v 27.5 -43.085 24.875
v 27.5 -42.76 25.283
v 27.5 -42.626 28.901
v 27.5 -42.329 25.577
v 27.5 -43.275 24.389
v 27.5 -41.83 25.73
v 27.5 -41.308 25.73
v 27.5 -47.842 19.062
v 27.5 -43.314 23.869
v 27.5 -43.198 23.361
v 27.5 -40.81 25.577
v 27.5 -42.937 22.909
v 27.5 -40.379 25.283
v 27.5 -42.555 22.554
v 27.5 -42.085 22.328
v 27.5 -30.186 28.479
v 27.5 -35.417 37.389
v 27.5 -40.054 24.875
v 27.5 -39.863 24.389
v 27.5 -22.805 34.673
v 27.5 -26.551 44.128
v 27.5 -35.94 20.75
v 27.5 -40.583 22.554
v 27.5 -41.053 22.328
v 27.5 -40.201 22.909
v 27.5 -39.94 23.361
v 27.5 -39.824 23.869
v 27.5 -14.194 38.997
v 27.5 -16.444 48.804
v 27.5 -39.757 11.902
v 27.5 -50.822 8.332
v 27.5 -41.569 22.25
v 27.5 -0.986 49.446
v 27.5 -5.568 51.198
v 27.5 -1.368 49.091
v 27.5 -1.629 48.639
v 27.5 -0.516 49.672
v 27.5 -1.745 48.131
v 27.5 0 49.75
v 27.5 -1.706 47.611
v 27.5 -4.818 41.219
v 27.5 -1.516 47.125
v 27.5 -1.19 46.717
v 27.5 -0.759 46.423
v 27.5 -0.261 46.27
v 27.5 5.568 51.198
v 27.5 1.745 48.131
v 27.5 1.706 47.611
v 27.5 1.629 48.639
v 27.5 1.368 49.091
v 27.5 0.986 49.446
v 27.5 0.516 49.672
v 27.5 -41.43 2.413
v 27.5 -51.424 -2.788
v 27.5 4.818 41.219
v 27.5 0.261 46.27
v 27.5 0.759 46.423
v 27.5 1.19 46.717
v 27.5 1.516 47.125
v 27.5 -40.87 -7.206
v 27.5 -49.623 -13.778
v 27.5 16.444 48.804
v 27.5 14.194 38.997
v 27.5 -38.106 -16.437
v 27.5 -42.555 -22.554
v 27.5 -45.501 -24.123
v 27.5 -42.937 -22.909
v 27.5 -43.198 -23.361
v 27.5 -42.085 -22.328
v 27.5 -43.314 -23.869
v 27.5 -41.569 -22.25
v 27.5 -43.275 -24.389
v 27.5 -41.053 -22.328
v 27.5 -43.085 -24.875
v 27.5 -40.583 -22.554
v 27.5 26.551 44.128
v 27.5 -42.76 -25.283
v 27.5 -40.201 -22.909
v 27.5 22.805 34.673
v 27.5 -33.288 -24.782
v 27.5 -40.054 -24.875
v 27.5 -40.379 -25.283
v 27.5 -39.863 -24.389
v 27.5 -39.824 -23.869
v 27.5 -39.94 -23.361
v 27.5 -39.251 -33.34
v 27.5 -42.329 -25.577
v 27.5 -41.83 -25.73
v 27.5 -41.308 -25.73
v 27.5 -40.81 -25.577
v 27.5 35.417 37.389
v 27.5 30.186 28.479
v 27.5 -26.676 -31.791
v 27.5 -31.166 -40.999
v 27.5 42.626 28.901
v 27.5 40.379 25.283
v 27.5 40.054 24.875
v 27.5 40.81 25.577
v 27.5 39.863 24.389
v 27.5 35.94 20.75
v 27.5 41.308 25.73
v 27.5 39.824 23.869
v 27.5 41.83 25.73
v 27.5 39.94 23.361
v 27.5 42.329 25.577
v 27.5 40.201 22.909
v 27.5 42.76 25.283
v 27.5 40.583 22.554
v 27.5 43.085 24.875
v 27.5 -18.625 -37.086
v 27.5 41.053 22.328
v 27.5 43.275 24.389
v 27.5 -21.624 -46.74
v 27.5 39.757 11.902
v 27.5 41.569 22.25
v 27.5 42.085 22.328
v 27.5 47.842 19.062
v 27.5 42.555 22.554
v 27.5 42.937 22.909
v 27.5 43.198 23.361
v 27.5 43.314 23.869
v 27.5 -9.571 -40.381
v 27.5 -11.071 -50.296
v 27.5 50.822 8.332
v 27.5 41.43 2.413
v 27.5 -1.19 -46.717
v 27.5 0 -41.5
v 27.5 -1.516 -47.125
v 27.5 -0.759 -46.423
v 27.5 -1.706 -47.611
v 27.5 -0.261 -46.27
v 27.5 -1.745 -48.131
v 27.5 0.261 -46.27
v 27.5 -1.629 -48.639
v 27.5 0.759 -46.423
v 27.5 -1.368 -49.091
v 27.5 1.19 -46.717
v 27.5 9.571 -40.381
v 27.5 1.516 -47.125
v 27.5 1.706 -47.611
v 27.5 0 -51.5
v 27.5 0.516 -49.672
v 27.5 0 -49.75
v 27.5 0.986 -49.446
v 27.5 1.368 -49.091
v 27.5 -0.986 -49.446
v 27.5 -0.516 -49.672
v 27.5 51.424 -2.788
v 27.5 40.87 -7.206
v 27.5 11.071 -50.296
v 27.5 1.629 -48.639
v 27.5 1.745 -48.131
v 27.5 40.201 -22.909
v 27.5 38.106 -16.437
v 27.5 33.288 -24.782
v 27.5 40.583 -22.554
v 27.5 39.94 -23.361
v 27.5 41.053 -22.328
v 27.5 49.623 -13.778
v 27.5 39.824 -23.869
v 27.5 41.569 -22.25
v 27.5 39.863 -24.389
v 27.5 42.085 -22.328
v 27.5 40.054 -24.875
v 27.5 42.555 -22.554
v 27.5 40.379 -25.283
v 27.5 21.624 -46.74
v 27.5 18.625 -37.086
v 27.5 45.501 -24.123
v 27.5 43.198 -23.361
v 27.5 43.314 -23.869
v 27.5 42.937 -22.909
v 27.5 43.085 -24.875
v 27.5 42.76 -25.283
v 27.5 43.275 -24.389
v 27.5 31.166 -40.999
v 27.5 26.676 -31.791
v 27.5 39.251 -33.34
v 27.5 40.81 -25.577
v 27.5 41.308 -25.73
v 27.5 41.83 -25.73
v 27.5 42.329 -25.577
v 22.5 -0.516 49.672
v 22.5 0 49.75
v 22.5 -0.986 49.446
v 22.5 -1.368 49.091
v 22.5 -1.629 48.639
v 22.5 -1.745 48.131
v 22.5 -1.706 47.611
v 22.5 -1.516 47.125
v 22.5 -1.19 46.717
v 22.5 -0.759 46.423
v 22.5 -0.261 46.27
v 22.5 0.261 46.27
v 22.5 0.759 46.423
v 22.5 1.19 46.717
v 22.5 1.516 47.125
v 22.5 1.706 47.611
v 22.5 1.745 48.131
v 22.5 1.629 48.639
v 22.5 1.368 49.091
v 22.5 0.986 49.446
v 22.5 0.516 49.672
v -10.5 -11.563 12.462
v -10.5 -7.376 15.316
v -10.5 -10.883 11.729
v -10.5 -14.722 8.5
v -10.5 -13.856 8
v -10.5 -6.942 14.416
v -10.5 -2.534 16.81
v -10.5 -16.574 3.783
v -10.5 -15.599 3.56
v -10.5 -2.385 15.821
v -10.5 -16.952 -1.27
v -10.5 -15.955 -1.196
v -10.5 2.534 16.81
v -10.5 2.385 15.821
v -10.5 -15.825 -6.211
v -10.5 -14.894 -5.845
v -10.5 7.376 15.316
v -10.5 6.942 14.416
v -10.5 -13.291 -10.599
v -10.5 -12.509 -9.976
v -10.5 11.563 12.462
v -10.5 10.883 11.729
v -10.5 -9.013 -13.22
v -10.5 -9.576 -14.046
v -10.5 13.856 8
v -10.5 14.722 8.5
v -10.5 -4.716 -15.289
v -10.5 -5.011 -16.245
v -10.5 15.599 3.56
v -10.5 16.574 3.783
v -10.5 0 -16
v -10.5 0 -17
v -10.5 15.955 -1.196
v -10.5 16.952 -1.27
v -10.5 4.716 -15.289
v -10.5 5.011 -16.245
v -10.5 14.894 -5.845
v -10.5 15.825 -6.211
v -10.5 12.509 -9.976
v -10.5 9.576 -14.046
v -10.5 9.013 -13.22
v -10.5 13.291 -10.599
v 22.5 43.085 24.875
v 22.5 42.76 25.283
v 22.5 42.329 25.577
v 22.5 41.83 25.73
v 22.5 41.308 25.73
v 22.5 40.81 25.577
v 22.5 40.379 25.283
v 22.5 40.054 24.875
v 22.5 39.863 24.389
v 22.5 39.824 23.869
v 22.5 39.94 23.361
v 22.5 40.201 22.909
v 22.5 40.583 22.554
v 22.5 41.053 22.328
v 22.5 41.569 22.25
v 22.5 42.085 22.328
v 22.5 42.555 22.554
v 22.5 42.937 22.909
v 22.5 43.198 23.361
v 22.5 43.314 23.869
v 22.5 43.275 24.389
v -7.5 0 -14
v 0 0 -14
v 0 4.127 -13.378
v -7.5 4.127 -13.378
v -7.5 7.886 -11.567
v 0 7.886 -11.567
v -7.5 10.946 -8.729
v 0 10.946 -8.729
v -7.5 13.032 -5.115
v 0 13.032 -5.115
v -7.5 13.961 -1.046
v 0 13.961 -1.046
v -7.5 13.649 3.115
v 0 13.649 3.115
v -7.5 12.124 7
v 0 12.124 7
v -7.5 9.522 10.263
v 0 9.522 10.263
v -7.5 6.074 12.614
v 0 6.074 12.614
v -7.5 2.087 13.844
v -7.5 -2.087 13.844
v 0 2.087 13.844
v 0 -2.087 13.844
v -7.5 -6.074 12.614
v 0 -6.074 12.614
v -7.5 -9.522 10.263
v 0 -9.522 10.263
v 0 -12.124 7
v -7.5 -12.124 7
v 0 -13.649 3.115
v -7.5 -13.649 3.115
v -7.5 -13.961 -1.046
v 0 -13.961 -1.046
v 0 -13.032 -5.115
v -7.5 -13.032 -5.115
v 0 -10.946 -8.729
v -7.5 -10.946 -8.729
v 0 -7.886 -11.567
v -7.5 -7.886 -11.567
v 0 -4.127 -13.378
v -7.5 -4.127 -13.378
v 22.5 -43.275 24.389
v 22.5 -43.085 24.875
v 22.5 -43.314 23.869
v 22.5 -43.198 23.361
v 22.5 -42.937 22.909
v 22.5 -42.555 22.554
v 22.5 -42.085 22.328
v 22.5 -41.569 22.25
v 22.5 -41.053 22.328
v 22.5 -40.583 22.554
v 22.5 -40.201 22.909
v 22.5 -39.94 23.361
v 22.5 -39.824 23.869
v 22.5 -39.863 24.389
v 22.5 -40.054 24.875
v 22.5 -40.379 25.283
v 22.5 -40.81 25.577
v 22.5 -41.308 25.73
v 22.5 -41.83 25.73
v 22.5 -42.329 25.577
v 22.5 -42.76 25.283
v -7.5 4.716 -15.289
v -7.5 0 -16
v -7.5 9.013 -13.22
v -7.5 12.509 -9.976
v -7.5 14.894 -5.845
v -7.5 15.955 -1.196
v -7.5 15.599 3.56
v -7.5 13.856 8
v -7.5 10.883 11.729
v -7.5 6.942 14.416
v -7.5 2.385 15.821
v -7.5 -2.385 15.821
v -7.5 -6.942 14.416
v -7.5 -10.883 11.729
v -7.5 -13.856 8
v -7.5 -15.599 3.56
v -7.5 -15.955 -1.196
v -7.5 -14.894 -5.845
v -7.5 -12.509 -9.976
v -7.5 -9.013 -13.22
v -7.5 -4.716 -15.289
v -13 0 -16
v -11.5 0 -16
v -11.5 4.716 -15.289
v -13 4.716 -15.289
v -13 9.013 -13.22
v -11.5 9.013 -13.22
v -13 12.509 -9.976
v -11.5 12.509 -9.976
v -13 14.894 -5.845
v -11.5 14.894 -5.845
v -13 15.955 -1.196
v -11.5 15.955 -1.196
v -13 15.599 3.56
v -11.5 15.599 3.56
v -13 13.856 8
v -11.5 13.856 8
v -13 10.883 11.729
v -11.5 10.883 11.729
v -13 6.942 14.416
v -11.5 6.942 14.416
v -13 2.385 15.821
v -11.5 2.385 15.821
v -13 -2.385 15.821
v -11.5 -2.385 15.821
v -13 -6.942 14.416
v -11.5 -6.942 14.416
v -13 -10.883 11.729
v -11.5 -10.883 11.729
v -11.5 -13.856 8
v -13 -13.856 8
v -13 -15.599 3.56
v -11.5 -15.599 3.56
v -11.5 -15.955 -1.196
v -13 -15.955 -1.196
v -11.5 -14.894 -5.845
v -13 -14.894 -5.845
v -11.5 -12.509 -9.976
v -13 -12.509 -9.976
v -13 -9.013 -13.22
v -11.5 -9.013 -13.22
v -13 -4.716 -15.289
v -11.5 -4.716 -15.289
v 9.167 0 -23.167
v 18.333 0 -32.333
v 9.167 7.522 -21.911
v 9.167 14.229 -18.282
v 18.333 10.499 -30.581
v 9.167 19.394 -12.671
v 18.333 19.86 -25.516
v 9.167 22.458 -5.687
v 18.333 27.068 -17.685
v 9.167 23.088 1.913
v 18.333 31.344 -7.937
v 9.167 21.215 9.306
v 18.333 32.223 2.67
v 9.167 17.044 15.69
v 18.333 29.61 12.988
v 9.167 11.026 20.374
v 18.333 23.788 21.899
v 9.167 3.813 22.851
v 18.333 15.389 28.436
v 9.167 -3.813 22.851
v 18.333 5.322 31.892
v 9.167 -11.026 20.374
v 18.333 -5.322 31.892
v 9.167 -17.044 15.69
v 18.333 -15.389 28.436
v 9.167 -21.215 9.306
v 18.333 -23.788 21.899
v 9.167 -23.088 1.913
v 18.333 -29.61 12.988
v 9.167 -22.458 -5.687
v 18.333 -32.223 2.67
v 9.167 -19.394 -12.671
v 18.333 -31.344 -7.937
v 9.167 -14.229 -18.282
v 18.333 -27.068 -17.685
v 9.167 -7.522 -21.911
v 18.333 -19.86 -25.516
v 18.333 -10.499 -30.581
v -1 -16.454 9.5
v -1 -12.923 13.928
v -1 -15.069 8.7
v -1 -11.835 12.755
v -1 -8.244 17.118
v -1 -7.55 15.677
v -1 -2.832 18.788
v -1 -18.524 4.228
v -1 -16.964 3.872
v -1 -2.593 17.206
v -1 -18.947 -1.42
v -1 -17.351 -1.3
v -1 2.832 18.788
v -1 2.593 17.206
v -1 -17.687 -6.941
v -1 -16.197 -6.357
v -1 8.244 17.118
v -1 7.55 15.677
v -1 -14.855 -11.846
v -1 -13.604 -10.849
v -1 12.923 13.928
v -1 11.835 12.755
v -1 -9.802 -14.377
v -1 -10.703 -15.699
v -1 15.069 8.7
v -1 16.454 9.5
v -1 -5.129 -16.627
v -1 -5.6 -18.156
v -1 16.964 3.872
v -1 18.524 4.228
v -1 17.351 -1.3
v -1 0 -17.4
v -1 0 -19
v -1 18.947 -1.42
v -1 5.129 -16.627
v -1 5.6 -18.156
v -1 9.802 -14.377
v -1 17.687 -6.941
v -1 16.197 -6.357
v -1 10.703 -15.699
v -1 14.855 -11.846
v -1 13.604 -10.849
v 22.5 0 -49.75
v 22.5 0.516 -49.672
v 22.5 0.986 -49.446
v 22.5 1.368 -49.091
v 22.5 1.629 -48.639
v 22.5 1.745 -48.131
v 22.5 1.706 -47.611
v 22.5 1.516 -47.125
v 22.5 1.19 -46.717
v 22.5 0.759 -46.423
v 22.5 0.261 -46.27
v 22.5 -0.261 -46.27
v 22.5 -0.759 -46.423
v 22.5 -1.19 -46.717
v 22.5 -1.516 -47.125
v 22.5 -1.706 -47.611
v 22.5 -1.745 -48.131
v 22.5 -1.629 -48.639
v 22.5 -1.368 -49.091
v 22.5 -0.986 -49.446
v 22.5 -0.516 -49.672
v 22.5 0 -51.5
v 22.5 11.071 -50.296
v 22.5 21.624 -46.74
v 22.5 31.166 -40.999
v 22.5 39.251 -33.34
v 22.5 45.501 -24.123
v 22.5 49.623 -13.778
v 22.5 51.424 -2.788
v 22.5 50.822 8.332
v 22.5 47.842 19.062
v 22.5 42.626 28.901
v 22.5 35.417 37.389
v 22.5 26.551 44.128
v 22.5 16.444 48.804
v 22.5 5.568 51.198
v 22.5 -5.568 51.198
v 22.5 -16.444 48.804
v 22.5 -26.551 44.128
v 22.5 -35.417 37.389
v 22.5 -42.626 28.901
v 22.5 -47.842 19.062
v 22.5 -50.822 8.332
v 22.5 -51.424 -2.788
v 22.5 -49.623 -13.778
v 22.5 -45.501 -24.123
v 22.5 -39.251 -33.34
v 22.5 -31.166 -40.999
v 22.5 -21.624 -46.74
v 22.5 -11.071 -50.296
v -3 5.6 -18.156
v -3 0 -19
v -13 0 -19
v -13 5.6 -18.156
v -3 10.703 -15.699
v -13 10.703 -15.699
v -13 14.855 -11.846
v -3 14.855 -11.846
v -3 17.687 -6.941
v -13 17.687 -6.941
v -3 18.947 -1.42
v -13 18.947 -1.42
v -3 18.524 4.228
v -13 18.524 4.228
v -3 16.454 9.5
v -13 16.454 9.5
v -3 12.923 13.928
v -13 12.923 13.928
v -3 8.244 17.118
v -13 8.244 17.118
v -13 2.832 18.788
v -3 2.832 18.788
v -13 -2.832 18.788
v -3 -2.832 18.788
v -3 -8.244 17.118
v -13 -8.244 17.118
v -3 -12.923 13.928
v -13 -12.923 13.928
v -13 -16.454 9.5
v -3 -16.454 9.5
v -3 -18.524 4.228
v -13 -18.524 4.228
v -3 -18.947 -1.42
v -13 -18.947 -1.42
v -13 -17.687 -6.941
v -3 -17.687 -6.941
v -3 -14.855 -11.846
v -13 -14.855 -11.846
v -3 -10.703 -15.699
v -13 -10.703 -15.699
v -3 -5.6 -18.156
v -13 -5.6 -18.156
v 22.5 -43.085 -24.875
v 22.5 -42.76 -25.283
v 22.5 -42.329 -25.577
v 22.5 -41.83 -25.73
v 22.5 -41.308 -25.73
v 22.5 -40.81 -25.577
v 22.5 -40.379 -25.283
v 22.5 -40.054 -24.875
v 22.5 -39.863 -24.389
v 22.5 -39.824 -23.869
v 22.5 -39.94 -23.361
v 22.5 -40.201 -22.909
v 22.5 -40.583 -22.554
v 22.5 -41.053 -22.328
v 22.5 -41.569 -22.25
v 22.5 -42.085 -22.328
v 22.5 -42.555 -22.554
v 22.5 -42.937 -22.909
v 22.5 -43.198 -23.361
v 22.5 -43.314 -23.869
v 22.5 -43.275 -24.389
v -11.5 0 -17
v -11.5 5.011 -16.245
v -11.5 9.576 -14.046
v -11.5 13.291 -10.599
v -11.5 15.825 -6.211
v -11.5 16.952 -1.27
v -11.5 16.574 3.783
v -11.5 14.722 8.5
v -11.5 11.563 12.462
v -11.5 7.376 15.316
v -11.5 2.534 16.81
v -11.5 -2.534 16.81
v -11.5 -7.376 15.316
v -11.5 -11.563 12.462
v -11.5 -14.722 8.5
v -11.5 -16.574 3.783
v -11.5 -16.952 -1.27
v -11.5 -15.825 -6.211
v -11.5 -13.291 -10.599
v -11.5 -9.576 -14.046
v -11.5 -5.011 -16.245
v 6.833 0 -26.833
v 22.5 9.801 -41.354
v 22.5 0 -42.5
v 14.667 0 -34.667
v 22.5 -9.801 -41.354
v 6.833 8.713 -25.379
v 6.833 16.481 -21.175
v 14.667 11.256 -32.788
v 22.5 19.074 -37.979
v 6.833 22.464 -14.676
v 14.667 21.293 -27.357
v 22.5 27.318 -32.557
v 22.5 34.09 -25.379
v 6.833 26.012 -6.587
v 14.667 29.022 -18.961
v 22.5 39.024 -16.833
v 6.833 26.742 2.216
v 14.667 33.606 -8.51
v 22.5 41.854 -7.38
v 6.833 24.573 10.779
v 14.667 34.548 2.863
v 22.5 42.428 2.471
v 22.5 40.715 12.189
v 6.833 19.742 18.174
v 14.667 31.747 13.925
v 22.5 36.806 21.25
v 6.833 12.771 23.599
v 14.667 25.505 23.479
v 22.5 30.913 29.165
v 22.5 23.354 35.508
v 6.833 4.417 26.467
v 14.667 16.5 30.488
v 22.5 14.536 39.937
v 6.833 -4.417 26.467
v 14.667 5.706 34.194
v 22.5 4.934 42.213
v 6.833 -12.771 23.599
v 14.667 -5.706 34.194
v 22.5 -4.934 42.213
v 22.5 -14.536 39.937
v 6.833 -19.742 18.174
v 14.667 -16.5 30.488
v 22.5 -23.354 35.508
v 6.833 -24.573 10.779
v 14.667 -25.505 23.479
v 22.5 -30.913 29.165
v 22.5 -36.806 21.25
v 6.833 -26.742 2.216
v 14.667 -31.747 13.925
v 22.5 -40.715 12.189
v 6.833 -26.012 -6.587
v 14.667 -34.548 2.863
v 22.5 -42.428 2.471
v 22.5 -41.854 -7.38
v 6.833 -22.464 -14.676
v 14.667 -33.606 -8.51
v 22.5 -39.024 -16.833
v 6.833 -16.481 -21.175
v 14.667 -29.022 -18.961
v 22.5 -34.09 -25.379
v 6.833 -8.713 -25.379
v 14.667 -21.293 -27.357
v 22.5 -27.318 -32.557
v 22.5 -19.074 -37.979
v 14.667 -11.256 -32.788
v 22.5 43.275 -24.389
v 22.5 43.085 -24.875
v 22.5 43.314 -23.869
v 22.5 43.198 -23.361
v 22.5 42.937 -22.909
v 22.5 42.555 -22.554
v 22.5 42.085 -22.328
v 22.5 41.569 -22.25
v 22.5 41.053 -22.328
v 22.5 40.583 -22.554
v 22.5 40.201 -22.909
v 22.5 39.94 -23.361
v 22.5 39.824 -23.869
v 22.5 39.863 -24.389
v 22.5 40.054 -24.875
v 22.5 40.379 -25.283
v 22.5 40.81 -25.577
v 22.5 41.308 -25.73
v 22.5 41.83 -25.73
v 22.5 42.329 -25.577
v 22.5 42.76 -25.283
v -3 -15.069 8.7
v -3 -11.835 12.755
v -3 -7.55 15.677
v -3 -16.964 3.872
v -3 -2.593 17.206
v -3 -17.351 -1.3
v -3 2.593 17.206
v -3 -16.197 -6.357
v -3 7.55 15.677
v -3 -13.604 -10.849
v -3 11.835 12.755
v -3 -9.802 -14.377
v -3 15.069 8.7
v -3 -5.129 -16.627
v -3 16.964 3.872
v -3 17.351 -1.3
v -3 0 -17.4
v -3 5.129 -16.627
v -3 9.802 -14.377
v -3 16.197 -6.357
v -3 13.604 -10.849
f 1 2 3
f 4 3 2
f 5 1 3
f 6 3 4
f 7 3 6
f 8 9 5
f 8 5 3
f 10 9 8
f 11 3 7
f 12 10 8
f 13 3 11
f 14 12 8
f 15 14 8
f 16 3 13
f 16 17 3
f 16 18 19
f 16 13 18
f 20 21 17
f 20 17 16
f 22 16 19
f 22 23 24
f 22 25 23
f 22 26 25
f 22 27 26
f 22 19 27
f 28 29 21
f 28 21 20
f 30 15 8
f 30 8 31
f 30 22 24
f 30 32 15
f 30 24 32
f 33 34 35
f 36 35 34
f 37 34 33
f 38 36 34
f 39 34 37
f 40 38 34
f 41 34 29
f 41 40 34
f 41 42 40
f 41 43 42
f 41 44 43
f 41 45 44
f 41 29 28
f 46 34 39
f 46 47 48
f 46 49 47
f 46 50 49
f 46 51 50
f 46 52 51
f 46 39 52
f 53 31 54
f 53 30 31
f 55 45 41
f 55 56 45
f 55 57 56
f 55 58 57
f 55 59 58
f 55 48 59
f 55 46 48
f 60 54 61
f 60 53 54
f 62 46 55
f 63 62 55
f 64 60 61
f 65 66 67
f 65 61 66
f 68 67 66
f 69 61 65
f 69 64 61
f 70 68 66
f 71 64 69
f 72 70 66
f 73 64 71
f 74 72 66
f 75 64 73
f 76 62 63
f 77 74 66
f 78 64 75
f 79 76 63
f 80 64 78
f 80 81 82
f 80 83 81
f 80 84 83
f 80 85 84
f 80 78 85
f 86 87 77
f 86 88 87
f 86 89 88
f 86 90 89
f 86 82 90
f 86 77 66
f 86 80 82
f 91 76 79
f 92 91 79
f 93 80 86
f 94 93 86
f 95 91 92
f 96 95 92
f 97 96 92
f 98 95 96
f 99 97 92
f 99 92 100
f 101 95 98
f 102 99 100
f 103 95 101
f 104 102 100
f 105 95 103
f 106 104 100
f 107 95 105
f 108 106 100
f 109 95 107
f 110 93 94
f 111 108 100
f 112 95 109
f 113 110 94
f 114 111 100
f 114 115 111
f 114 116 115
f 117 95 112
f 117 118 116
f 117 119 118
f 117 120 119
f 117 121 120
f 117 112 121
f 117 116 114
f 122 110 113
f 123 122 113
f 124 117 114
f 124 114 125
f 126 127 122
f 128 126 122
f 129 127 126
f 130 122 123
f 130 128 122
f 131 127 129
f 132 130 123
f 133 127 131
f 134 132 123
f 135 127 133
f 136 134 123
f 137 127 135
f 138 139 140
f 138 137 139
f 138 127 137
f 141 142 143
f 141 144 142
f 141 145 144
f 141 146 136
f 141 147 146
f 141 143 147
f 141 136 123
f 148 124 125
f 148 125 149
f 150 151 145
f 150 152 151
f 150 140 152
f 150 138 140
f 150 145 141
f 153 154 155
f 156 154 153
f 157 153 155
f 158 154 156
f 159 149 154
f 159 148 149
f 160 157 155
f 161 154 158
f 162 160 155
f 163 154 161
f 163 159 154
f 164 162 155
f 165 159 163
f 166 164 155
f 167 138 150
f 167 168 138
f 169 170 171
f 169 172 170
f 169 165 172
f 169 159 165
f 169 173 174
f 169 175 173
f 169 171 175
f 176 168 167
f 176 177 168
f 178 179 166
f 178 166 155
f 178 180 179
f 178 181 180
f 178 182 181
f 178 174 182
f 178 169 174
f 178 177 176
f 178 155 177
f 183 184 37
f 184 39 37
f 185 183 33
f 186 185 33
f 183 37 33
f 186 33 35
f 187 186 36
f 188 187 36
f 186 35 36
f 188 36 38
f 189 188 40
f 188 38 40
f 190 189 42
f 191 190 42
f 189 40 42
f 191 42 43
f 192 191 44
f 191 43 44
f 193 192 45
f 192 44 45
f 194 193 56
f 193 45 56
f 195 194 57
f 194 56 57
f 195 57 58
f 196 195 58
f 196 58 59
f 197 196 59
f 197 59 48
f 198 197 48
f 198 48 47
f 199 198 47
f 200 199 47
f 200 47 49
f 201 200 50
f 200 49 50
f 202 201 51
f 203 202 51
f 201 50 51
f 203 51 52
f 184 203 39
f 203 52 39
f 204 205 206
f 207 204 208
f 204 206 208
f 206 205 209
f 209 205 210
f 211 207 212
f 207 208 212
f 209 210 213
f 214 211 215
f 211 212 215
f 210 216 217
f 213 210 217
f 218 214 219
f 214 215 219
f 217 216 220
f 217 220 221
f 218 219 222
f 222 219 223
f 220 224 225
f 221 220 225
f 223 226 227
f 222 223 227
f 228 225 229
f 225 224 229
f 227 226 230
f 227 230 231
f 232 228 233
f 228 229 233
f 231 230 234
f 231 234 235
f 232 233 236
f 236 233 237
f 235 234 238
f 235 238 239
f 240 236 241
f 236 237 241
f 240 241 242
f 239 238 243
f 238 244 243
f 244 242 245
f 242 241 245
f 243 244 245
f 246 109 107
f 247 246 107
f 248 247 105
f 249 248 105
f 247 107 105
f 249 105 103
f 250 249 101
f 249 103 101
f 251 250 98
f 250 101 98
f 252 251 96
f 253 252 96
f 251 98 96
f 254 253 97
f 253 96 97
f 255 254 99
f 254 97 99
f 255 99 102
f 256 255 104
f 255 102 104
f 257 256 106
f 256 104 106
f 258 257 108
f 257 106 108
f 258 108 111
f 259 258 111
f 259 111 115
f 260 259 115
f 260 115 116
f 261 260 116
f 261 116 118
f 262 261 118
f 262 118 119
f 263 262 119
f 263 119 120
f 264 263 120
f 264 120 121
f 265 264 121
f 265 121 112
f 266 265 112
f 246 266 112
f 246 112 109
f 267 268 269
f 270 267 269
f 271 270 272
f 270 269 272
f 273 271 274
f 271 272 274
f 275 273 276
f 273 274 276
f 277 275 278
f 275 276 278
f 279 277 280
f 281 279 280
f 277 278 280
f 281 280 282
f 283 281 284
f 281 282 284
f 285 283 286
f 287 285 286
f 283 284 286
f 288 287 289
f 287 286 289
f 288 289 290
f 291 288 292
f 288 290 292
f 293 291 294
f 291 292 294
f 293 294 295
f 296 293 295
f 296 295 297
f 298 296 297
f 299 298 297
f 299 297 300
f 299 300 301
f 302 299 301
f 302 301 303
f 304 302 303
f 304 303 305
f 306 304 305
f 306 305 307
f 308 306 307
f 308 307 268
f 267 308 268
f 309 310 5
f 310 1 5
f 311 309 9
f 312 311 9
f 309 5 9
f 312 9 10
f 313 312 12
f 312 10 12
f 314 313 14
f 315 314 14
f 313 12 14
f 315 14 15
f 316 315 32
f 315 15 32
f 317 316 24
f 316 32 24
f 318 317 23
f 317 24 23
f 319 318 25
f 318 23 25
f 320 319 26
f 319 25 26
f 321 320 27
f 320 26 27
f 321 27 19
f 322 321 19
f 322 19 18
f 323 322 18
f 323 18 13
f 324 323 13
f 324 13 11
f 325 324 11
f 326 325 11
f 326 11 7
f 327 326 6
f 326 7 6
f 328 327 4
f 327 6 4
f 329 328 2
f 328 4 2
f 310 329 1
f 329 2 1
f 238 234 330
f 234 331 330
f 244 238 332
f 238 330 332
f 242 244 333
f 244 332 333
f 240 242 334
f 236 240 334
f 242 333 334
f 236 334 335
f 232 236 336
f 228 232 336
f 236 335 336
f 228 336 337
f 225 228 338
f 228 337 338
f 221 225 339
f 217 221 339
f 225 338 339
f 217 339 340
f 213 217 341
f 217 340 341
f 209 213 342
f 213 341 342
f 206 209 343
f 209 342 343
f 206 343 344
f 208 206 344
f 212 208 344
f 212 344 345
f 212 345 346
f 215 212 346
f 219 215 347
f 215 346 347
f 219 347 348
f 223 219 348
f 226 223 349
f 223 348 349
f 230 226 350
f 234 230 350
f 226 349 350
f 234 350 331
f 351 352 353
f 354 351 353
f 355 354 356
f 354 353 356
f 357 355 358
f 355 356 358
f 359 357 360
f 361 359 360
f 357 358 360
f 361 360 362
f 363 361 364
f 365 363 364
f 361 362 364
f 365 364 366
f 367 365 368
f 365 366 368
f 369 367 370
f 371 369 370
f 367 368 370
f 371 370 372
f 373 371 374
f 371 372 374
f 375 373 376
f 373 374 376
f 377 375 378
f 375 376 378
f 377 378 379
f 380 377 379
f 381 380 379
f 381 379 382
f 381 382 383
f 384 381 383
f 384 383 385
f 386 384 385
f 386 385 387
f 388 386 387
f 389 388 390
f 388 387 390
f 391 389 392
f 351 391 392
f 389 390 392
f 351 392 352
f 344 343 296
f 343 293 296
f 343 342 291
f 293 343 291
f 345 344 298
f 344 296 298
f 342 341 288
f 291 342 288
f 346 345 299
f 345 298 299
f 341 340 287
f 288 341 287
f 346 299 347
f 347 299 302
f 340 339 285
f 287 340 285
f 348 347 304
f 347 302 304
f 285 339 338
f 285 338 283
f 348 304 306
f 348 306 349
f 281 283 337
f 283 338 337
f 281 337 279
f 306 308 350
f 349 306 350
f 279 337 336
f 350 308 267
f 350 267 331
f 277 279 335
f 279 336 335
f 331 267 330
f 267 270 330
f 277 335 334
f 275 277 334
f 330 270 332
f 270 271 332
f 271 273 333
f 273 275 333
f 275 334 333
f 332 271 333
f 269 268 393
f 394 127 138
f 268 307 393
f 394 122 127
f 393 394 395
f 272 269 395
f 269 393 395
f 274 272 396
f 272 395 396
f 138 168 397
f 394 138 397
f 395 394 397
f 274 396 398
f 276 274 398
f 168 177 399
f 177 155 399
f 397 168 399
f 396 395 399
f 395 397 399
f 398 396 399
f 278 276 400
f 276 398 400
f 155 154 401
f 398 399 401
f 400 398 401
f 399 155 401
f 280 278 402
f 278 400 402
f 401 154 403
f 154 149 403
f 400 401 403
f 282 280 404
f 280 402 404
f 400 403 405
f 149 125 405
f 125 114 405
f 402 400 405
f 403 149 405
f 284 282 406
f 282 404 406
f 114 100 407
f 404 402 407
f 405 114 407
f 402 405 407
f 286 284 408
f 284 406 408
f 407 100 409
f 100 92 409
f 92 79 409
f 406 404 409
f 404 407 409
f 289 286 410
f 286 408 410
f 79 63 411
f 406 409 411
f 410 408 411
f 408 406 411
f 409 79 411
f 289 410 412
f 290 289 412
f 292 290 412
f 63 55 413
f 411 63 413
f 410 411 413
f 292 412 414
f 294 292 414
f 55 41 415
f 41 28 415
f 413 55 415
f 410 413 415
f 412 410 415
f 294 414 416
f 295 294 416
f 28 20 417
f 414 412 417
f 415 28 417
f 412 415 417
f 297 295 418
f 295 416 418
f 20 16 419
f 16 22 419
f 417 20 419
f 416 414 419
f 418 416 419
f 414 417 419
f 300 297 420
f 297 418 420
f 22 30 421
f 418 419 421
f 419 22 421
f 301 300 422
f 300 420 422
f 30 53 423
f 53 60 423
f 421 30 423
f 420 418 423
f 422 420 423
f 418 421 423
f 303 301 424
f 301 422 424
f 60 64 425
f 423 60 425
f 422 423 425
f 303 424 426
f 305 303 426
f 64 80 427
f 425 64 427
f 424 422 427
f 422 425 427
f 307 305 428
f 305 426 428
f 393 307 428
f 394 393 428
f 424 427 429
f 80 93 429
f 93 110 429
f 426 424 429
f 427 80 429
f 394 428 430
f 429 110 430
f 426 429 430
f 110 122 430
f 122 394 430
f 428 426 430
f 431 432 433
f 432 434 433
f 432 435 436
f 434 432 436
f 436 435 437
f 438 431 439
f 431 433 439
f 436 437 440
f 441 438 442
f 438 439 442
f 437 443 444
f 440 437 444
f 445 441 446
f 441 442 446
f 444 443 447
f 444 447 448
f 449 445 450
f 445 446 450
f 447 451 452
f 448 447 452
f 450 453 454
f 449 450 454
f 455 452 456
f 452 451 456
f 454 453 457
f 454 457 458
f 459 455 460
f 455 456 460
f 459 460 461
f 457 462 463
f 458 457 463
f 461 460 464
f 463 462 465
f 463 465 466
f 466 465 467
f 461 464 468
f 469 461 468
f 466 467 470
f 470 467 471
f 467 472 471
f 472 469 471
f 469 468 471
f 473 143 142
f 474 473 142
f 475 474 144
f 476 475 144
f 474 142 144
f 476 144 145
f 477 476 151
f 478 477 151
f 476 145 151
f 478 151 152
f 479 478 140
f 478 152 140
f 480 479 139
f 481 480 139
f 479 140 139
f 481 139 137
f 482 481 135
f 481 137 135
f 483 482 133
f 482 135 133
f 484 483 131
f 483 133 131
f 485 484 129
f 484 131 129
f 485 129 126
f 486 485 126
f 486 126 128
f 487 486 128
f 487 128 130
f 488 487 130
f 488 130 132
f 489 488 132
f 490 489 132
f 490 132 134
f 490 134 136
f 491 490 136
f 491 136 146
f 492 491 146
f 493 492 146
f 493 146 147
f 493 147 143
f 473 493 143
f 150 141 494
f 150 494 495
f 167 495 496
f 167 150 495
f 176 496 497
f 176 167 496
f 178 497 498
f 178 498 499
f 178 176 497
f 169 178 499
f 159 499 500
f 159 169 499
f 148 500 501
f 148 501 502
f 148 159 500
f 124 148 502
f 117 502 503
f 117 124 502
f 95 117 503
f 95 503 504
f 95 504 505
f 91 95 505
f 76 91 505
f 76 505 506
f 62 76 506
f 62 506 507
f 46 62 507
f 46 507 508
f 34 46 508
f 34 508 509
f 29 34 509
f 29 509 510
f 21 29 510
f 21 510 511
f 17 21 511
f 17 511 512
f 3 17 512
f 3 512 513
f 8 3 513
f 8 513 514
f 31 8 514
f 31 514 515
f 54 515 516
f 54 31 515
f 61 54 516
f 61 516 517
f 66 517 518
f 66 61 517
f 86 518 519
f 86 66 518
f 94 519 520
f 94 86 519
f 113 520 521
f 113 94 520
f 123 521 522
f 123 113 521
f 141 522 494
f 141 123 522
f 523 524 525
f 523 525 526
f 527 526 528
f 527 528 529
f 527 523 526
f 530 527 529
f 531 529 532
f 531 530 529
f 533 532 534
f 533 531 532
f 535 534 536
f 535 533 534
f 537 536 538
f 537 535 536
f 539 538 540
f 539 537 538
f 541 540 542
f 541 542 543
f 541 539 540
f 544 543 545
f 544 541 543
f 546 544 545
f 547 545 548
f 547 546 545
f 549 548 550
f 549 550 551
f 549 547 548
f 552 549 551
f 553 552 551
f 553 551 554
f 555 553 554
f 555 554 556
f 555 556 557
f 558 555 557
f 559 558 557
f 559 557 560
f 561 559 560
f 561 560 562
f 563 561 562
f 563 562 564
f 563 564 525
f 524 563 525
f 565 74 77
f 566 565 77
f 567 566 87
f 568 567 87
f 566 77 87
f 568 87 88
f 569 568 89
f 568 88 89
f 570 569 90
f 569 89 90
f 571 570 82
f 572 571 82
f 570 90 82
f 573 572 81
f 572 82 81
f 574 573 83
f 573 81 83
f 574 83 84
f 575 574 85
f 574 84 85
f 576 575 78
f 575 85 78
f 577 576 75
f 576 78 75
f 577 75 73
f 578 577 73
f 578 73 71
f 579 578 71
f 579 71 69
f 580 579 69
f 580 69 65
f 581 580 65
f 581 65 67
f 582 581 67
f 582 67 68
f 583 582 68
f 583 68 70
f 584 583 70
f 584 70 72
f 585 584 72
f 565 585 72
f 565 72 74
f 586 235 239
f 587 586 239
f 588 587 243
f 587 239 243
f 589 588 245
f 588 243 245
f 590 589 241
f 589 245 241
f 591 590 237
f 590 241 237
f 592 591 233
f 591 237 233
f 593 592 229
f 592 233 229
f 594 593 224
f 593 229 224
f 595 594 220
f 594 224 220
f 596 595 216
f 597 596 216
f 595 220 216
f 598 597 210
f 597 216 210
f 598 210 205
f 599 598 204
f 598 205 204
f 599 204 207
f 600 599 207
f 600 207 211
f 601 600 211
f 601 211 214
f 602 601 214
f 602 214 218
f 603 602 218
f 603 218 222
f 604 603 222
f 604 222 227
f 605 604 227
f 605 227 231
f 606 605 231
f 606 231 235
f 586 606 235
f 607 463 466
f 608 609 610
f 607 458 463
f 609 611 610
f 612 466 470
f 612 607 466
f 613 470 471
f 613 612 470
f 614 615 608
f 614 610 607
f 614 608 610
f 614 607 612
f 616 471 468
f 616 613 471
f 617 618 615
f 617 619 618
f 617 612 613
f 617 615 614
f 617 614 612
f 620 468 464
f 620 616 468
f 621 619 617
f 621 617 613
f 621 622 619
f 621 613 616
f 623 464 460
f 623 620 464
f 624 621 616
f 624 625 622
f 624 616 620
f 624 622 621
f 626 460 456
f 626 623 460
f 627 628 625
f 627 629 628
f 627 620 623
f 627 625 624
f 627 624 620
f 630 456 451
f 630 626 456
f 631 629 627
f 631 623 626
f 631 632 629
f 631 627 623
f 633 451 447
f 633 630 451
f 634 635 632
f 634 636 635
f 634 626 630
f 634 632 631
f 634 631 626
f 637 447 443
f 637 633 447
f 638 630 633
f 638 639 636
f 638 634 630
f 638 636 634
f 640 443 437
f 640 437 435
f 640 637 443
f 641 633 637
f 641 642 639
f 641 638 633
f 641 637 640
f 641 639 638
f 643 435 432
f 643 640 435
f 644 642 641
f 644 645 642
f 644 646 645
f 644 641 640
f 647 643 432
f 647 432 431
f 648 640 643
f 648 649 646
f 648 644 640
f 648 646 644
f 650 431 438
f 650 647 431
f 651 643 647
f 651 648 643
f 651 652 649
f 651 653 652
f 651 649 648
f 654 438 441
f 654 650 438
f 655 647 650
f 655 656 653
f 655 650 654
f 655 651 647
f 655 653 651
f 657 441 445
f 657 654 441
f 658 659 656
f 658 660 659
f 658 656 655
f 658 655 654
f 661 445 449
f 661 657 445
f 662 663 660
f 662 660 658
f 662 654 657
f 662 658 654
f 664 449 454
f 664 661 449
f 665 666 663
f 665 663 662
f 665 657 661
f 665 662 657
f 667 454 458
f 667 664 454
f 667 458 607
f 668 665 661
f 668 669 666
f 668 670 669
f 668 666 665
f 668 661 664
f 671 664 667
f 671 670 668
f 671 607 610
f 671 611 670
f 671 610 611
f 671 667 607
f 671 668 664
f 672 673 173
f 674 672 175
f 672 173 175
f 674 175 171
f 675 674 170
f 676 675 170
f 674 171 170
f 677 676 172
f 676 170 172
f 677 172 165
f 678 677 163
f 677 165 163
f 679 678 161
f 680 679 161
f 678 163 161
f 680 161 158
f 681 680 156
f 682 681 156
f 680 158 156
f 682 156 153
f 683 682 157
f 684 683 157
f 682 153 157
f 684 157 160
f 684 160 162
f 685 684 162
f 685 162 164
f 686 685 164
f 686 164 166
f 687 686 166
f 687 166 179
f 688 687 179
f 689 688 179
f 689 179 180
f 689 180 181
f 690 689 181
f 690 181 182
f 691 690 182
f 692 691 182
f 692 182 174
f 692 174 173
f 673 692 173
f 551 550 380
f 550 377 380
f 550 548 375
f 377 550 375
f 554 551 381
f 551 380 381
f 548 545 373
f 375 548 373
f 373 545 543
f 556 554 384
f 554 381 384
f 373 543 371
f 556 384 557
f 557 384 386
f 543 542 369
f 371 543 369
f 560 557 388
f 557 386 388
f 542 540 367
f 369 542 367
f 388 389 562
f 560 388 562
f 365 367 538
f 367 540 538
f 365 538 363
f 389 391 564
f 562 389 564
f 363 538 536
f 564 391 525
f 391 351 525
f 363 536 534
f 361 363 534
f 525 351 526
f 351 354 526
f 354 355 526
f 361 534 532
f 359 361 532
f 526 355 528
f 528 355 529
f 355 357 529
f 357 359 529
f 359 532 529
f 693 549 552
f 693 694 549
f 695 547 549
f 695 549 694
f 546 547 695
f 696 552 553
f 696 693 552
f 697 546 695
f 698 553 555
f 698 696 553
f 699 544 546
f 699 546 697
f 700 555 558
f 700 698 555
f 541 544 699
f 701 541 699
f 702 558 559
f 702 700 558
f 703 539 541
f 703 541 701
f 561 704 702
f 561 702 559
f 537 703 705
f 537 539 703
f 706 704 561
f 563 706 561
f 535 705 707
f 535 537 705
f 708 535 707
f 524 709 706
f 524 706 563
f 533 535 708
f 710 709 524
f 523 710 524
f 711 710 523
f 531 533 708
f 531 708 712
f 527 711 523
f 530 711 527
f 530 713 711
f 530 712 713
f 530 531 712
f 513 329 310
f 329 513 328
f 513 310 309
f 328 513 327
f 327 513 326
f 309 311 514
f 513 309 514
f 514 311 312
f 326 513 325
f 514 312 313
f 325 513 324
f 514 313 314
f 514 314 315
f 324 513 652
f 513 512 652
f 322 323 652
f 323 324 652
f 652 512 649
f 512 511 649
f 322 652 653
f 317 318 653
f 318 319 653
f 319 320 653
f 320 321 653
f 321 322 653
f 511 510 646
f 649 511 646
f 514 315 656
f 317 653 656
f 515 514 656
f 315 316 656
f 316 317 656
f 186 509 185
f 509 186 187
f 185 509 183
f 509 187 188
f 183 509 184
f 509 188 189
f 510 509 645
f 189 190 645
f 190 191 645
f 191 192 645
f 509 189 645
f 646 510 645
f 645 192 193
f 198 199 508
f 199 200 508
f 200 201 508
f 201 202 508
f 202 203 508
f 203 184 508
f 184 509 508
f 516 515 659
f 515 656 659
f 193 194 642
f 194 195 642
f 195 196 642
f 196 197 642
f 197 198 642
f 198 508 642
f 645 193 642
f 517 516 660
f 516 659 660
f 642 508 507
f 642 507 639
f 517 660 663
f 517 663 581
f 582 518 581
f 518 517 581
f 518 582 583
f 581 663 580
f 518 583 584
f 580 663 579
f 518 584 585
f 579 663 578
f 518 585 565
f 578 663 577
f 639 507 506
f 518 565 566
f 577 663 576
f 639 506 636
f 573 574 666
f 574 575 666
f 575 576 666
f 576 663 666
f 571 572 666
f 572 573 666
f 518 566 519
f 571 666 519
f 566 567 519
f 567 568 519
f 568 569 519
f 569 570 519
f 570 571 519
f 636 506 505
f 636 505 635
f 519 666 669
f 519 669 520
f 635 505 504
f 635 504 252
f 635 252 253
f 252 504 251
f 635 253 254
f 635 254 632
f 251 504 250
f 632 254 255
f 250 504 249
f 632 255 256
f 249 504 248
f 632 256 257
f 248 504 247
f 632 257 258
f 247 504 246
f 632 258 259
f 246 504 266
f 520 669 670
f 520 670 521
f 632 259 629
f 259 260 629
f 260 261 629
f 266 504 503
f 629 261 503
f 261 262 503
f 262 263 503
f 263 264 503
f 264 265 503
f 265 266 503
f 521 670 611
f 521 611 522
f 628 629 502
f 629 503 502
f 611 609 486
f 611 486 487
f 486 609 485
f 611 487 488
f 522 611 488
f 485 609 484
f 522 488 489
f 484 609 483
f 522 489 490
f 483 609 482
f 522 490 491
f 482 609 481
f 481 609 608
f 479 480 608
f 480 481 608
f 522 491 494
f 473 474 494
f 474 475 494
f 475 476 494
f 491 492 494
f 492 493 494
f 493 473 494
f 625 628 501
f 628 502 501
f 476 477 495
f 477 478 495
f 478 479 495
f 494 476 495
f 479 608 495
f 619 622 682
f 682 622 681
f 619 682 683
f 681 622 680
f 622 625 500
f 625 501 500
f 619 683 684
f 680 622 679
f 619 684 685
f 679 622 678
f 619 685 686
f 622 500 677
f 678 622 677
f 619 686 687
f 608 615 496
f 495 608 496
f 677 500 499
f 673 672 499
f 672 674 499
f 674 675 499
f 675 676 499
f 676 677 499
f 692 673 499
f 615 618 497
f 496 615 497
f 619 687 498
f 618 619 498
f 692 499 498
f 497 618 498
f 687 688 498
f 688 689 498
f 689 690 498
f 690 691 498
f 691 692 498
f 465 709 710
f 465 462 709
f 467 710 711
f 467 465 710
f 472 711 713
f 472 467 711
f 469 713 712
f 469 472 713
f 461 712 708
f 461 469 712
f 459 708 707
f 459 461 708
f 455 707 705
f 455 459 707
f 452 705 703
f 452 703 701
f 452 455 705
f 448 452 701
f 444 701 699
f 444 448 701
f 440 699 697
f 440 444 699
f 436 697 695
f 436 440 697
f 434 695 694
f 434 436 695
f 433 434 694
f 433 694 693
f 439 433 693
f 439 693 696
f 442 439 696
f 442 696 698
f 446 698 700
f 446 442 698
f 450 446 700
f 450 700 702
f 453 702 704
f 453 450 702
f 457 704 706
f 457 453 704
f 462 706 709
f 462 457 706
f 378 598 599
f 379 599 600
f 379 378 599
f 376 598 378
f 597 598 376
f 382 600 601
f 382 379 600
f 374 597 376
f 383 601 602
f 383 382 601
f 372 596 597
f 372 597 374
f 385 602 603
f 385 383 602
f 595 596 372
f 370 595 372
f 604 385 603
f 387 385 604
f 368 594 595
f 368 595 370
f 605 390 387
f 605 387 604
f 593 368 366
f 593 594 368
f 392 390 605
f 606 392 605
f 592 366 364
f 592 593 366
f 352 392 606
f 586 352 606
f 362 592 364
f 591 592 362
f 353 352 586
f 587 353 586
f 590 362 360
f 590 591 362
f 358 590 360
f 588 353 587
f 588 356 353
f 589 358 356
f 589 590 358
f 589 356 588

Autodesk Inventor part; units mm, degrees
ref_plane "YZ Plane" through (0, 0, 0) normal (1, 0, 0) x (0, 1, 0)
ref_plane "XZ Plane" through (0, 0, 0) normal (0, 1, 0) x (-1, 0, 0)
ref_plane "XY Plane" through (0, 0, 0) normal (0, 0, 1) x (1, 0, 0)
sketch "Sketch1" plane through (0, 0, 0) normal (0, 1, 0) x (-1, 0, 0)
  line L0 (0, 0) -> (-9.3015, 0)
  line L1 (7.5, -14) -> (0, -14)
  line L2 (13, -19) -> (13, -16)
  line L3 (7.5, -16) -> (7.5, -14)
  line L4 (13, -19) -> (3, -19)
  line L5 (3, -19) -> (3, -17.4)
  line L6 (3, -17.4) -> (1, -17.4)
  line L7 (1, -17.4) -> (1, -19)
  line L8 (-22.5, -51.5) -> (-27.5, -51.5)
  line L9 (-27.5, -51.5) -> (-27.5, -41.5)
  line L10 (-27.5, -41.5) -> (0, -14)
  line L11 (13, -16) -> (11.5, -16)
  line L12 (11.5, -16) -> (11.5, -17)
  line L13 (11.5, -17) -> (10.5, -17)
  line L14 (10.5, -17) -> (10.5, -16)
  line L15 (10.5, -16) -> (7.5, -16)
  line L16 (-22.5, -51.5) -> (-22.5, -42.5)
  line L17 (-22.5, -42.5) -> (1, -19)
  point P0 (25, -13.6173)
  dimension "d2" = 28
  dimension "d19" = 103
  dimension "d20" = 83
  dimension "d21" = 5
  dimension "d22" = 1.6
  dimension "d23" = 135
  dimension "d24" = 2
  dimension "d25" = 1
  dimension "d26" = 1
  dimension "d27" = 3
  dimension "d28" = 1.5
  dimension "d29" = 38
  dimension "d30" = 2
  dimension "d32" = 10
  dimension "d33" = 9
revolve "Revolution1" add sketch "Sketch1" angle 360 about axis through (0, 0, 0) along (1, 0, 0)
thread "Thread4" size "M38x1.5" class "6g" standard "ANSI Metric M Profile" full length
sketch "Sketch2" plane through (22.5, 0, 0) normal (-1, 0, 0) x (0, 0, 1)
  point P0 (0, 0)
  point P1 (48, 0)
  dimension "d36" = 48
hole "Hole1" at (22.5, 0, 48) direction (1, 0, 0) diameter 3.5 depth 5
pattern_circular "Circular Pattern1" count 6 over 360 about axis through (25, 0, 0) along (1, 0, 0) of "Hole1"
properties part number "027" material "Aluminum 6061"
